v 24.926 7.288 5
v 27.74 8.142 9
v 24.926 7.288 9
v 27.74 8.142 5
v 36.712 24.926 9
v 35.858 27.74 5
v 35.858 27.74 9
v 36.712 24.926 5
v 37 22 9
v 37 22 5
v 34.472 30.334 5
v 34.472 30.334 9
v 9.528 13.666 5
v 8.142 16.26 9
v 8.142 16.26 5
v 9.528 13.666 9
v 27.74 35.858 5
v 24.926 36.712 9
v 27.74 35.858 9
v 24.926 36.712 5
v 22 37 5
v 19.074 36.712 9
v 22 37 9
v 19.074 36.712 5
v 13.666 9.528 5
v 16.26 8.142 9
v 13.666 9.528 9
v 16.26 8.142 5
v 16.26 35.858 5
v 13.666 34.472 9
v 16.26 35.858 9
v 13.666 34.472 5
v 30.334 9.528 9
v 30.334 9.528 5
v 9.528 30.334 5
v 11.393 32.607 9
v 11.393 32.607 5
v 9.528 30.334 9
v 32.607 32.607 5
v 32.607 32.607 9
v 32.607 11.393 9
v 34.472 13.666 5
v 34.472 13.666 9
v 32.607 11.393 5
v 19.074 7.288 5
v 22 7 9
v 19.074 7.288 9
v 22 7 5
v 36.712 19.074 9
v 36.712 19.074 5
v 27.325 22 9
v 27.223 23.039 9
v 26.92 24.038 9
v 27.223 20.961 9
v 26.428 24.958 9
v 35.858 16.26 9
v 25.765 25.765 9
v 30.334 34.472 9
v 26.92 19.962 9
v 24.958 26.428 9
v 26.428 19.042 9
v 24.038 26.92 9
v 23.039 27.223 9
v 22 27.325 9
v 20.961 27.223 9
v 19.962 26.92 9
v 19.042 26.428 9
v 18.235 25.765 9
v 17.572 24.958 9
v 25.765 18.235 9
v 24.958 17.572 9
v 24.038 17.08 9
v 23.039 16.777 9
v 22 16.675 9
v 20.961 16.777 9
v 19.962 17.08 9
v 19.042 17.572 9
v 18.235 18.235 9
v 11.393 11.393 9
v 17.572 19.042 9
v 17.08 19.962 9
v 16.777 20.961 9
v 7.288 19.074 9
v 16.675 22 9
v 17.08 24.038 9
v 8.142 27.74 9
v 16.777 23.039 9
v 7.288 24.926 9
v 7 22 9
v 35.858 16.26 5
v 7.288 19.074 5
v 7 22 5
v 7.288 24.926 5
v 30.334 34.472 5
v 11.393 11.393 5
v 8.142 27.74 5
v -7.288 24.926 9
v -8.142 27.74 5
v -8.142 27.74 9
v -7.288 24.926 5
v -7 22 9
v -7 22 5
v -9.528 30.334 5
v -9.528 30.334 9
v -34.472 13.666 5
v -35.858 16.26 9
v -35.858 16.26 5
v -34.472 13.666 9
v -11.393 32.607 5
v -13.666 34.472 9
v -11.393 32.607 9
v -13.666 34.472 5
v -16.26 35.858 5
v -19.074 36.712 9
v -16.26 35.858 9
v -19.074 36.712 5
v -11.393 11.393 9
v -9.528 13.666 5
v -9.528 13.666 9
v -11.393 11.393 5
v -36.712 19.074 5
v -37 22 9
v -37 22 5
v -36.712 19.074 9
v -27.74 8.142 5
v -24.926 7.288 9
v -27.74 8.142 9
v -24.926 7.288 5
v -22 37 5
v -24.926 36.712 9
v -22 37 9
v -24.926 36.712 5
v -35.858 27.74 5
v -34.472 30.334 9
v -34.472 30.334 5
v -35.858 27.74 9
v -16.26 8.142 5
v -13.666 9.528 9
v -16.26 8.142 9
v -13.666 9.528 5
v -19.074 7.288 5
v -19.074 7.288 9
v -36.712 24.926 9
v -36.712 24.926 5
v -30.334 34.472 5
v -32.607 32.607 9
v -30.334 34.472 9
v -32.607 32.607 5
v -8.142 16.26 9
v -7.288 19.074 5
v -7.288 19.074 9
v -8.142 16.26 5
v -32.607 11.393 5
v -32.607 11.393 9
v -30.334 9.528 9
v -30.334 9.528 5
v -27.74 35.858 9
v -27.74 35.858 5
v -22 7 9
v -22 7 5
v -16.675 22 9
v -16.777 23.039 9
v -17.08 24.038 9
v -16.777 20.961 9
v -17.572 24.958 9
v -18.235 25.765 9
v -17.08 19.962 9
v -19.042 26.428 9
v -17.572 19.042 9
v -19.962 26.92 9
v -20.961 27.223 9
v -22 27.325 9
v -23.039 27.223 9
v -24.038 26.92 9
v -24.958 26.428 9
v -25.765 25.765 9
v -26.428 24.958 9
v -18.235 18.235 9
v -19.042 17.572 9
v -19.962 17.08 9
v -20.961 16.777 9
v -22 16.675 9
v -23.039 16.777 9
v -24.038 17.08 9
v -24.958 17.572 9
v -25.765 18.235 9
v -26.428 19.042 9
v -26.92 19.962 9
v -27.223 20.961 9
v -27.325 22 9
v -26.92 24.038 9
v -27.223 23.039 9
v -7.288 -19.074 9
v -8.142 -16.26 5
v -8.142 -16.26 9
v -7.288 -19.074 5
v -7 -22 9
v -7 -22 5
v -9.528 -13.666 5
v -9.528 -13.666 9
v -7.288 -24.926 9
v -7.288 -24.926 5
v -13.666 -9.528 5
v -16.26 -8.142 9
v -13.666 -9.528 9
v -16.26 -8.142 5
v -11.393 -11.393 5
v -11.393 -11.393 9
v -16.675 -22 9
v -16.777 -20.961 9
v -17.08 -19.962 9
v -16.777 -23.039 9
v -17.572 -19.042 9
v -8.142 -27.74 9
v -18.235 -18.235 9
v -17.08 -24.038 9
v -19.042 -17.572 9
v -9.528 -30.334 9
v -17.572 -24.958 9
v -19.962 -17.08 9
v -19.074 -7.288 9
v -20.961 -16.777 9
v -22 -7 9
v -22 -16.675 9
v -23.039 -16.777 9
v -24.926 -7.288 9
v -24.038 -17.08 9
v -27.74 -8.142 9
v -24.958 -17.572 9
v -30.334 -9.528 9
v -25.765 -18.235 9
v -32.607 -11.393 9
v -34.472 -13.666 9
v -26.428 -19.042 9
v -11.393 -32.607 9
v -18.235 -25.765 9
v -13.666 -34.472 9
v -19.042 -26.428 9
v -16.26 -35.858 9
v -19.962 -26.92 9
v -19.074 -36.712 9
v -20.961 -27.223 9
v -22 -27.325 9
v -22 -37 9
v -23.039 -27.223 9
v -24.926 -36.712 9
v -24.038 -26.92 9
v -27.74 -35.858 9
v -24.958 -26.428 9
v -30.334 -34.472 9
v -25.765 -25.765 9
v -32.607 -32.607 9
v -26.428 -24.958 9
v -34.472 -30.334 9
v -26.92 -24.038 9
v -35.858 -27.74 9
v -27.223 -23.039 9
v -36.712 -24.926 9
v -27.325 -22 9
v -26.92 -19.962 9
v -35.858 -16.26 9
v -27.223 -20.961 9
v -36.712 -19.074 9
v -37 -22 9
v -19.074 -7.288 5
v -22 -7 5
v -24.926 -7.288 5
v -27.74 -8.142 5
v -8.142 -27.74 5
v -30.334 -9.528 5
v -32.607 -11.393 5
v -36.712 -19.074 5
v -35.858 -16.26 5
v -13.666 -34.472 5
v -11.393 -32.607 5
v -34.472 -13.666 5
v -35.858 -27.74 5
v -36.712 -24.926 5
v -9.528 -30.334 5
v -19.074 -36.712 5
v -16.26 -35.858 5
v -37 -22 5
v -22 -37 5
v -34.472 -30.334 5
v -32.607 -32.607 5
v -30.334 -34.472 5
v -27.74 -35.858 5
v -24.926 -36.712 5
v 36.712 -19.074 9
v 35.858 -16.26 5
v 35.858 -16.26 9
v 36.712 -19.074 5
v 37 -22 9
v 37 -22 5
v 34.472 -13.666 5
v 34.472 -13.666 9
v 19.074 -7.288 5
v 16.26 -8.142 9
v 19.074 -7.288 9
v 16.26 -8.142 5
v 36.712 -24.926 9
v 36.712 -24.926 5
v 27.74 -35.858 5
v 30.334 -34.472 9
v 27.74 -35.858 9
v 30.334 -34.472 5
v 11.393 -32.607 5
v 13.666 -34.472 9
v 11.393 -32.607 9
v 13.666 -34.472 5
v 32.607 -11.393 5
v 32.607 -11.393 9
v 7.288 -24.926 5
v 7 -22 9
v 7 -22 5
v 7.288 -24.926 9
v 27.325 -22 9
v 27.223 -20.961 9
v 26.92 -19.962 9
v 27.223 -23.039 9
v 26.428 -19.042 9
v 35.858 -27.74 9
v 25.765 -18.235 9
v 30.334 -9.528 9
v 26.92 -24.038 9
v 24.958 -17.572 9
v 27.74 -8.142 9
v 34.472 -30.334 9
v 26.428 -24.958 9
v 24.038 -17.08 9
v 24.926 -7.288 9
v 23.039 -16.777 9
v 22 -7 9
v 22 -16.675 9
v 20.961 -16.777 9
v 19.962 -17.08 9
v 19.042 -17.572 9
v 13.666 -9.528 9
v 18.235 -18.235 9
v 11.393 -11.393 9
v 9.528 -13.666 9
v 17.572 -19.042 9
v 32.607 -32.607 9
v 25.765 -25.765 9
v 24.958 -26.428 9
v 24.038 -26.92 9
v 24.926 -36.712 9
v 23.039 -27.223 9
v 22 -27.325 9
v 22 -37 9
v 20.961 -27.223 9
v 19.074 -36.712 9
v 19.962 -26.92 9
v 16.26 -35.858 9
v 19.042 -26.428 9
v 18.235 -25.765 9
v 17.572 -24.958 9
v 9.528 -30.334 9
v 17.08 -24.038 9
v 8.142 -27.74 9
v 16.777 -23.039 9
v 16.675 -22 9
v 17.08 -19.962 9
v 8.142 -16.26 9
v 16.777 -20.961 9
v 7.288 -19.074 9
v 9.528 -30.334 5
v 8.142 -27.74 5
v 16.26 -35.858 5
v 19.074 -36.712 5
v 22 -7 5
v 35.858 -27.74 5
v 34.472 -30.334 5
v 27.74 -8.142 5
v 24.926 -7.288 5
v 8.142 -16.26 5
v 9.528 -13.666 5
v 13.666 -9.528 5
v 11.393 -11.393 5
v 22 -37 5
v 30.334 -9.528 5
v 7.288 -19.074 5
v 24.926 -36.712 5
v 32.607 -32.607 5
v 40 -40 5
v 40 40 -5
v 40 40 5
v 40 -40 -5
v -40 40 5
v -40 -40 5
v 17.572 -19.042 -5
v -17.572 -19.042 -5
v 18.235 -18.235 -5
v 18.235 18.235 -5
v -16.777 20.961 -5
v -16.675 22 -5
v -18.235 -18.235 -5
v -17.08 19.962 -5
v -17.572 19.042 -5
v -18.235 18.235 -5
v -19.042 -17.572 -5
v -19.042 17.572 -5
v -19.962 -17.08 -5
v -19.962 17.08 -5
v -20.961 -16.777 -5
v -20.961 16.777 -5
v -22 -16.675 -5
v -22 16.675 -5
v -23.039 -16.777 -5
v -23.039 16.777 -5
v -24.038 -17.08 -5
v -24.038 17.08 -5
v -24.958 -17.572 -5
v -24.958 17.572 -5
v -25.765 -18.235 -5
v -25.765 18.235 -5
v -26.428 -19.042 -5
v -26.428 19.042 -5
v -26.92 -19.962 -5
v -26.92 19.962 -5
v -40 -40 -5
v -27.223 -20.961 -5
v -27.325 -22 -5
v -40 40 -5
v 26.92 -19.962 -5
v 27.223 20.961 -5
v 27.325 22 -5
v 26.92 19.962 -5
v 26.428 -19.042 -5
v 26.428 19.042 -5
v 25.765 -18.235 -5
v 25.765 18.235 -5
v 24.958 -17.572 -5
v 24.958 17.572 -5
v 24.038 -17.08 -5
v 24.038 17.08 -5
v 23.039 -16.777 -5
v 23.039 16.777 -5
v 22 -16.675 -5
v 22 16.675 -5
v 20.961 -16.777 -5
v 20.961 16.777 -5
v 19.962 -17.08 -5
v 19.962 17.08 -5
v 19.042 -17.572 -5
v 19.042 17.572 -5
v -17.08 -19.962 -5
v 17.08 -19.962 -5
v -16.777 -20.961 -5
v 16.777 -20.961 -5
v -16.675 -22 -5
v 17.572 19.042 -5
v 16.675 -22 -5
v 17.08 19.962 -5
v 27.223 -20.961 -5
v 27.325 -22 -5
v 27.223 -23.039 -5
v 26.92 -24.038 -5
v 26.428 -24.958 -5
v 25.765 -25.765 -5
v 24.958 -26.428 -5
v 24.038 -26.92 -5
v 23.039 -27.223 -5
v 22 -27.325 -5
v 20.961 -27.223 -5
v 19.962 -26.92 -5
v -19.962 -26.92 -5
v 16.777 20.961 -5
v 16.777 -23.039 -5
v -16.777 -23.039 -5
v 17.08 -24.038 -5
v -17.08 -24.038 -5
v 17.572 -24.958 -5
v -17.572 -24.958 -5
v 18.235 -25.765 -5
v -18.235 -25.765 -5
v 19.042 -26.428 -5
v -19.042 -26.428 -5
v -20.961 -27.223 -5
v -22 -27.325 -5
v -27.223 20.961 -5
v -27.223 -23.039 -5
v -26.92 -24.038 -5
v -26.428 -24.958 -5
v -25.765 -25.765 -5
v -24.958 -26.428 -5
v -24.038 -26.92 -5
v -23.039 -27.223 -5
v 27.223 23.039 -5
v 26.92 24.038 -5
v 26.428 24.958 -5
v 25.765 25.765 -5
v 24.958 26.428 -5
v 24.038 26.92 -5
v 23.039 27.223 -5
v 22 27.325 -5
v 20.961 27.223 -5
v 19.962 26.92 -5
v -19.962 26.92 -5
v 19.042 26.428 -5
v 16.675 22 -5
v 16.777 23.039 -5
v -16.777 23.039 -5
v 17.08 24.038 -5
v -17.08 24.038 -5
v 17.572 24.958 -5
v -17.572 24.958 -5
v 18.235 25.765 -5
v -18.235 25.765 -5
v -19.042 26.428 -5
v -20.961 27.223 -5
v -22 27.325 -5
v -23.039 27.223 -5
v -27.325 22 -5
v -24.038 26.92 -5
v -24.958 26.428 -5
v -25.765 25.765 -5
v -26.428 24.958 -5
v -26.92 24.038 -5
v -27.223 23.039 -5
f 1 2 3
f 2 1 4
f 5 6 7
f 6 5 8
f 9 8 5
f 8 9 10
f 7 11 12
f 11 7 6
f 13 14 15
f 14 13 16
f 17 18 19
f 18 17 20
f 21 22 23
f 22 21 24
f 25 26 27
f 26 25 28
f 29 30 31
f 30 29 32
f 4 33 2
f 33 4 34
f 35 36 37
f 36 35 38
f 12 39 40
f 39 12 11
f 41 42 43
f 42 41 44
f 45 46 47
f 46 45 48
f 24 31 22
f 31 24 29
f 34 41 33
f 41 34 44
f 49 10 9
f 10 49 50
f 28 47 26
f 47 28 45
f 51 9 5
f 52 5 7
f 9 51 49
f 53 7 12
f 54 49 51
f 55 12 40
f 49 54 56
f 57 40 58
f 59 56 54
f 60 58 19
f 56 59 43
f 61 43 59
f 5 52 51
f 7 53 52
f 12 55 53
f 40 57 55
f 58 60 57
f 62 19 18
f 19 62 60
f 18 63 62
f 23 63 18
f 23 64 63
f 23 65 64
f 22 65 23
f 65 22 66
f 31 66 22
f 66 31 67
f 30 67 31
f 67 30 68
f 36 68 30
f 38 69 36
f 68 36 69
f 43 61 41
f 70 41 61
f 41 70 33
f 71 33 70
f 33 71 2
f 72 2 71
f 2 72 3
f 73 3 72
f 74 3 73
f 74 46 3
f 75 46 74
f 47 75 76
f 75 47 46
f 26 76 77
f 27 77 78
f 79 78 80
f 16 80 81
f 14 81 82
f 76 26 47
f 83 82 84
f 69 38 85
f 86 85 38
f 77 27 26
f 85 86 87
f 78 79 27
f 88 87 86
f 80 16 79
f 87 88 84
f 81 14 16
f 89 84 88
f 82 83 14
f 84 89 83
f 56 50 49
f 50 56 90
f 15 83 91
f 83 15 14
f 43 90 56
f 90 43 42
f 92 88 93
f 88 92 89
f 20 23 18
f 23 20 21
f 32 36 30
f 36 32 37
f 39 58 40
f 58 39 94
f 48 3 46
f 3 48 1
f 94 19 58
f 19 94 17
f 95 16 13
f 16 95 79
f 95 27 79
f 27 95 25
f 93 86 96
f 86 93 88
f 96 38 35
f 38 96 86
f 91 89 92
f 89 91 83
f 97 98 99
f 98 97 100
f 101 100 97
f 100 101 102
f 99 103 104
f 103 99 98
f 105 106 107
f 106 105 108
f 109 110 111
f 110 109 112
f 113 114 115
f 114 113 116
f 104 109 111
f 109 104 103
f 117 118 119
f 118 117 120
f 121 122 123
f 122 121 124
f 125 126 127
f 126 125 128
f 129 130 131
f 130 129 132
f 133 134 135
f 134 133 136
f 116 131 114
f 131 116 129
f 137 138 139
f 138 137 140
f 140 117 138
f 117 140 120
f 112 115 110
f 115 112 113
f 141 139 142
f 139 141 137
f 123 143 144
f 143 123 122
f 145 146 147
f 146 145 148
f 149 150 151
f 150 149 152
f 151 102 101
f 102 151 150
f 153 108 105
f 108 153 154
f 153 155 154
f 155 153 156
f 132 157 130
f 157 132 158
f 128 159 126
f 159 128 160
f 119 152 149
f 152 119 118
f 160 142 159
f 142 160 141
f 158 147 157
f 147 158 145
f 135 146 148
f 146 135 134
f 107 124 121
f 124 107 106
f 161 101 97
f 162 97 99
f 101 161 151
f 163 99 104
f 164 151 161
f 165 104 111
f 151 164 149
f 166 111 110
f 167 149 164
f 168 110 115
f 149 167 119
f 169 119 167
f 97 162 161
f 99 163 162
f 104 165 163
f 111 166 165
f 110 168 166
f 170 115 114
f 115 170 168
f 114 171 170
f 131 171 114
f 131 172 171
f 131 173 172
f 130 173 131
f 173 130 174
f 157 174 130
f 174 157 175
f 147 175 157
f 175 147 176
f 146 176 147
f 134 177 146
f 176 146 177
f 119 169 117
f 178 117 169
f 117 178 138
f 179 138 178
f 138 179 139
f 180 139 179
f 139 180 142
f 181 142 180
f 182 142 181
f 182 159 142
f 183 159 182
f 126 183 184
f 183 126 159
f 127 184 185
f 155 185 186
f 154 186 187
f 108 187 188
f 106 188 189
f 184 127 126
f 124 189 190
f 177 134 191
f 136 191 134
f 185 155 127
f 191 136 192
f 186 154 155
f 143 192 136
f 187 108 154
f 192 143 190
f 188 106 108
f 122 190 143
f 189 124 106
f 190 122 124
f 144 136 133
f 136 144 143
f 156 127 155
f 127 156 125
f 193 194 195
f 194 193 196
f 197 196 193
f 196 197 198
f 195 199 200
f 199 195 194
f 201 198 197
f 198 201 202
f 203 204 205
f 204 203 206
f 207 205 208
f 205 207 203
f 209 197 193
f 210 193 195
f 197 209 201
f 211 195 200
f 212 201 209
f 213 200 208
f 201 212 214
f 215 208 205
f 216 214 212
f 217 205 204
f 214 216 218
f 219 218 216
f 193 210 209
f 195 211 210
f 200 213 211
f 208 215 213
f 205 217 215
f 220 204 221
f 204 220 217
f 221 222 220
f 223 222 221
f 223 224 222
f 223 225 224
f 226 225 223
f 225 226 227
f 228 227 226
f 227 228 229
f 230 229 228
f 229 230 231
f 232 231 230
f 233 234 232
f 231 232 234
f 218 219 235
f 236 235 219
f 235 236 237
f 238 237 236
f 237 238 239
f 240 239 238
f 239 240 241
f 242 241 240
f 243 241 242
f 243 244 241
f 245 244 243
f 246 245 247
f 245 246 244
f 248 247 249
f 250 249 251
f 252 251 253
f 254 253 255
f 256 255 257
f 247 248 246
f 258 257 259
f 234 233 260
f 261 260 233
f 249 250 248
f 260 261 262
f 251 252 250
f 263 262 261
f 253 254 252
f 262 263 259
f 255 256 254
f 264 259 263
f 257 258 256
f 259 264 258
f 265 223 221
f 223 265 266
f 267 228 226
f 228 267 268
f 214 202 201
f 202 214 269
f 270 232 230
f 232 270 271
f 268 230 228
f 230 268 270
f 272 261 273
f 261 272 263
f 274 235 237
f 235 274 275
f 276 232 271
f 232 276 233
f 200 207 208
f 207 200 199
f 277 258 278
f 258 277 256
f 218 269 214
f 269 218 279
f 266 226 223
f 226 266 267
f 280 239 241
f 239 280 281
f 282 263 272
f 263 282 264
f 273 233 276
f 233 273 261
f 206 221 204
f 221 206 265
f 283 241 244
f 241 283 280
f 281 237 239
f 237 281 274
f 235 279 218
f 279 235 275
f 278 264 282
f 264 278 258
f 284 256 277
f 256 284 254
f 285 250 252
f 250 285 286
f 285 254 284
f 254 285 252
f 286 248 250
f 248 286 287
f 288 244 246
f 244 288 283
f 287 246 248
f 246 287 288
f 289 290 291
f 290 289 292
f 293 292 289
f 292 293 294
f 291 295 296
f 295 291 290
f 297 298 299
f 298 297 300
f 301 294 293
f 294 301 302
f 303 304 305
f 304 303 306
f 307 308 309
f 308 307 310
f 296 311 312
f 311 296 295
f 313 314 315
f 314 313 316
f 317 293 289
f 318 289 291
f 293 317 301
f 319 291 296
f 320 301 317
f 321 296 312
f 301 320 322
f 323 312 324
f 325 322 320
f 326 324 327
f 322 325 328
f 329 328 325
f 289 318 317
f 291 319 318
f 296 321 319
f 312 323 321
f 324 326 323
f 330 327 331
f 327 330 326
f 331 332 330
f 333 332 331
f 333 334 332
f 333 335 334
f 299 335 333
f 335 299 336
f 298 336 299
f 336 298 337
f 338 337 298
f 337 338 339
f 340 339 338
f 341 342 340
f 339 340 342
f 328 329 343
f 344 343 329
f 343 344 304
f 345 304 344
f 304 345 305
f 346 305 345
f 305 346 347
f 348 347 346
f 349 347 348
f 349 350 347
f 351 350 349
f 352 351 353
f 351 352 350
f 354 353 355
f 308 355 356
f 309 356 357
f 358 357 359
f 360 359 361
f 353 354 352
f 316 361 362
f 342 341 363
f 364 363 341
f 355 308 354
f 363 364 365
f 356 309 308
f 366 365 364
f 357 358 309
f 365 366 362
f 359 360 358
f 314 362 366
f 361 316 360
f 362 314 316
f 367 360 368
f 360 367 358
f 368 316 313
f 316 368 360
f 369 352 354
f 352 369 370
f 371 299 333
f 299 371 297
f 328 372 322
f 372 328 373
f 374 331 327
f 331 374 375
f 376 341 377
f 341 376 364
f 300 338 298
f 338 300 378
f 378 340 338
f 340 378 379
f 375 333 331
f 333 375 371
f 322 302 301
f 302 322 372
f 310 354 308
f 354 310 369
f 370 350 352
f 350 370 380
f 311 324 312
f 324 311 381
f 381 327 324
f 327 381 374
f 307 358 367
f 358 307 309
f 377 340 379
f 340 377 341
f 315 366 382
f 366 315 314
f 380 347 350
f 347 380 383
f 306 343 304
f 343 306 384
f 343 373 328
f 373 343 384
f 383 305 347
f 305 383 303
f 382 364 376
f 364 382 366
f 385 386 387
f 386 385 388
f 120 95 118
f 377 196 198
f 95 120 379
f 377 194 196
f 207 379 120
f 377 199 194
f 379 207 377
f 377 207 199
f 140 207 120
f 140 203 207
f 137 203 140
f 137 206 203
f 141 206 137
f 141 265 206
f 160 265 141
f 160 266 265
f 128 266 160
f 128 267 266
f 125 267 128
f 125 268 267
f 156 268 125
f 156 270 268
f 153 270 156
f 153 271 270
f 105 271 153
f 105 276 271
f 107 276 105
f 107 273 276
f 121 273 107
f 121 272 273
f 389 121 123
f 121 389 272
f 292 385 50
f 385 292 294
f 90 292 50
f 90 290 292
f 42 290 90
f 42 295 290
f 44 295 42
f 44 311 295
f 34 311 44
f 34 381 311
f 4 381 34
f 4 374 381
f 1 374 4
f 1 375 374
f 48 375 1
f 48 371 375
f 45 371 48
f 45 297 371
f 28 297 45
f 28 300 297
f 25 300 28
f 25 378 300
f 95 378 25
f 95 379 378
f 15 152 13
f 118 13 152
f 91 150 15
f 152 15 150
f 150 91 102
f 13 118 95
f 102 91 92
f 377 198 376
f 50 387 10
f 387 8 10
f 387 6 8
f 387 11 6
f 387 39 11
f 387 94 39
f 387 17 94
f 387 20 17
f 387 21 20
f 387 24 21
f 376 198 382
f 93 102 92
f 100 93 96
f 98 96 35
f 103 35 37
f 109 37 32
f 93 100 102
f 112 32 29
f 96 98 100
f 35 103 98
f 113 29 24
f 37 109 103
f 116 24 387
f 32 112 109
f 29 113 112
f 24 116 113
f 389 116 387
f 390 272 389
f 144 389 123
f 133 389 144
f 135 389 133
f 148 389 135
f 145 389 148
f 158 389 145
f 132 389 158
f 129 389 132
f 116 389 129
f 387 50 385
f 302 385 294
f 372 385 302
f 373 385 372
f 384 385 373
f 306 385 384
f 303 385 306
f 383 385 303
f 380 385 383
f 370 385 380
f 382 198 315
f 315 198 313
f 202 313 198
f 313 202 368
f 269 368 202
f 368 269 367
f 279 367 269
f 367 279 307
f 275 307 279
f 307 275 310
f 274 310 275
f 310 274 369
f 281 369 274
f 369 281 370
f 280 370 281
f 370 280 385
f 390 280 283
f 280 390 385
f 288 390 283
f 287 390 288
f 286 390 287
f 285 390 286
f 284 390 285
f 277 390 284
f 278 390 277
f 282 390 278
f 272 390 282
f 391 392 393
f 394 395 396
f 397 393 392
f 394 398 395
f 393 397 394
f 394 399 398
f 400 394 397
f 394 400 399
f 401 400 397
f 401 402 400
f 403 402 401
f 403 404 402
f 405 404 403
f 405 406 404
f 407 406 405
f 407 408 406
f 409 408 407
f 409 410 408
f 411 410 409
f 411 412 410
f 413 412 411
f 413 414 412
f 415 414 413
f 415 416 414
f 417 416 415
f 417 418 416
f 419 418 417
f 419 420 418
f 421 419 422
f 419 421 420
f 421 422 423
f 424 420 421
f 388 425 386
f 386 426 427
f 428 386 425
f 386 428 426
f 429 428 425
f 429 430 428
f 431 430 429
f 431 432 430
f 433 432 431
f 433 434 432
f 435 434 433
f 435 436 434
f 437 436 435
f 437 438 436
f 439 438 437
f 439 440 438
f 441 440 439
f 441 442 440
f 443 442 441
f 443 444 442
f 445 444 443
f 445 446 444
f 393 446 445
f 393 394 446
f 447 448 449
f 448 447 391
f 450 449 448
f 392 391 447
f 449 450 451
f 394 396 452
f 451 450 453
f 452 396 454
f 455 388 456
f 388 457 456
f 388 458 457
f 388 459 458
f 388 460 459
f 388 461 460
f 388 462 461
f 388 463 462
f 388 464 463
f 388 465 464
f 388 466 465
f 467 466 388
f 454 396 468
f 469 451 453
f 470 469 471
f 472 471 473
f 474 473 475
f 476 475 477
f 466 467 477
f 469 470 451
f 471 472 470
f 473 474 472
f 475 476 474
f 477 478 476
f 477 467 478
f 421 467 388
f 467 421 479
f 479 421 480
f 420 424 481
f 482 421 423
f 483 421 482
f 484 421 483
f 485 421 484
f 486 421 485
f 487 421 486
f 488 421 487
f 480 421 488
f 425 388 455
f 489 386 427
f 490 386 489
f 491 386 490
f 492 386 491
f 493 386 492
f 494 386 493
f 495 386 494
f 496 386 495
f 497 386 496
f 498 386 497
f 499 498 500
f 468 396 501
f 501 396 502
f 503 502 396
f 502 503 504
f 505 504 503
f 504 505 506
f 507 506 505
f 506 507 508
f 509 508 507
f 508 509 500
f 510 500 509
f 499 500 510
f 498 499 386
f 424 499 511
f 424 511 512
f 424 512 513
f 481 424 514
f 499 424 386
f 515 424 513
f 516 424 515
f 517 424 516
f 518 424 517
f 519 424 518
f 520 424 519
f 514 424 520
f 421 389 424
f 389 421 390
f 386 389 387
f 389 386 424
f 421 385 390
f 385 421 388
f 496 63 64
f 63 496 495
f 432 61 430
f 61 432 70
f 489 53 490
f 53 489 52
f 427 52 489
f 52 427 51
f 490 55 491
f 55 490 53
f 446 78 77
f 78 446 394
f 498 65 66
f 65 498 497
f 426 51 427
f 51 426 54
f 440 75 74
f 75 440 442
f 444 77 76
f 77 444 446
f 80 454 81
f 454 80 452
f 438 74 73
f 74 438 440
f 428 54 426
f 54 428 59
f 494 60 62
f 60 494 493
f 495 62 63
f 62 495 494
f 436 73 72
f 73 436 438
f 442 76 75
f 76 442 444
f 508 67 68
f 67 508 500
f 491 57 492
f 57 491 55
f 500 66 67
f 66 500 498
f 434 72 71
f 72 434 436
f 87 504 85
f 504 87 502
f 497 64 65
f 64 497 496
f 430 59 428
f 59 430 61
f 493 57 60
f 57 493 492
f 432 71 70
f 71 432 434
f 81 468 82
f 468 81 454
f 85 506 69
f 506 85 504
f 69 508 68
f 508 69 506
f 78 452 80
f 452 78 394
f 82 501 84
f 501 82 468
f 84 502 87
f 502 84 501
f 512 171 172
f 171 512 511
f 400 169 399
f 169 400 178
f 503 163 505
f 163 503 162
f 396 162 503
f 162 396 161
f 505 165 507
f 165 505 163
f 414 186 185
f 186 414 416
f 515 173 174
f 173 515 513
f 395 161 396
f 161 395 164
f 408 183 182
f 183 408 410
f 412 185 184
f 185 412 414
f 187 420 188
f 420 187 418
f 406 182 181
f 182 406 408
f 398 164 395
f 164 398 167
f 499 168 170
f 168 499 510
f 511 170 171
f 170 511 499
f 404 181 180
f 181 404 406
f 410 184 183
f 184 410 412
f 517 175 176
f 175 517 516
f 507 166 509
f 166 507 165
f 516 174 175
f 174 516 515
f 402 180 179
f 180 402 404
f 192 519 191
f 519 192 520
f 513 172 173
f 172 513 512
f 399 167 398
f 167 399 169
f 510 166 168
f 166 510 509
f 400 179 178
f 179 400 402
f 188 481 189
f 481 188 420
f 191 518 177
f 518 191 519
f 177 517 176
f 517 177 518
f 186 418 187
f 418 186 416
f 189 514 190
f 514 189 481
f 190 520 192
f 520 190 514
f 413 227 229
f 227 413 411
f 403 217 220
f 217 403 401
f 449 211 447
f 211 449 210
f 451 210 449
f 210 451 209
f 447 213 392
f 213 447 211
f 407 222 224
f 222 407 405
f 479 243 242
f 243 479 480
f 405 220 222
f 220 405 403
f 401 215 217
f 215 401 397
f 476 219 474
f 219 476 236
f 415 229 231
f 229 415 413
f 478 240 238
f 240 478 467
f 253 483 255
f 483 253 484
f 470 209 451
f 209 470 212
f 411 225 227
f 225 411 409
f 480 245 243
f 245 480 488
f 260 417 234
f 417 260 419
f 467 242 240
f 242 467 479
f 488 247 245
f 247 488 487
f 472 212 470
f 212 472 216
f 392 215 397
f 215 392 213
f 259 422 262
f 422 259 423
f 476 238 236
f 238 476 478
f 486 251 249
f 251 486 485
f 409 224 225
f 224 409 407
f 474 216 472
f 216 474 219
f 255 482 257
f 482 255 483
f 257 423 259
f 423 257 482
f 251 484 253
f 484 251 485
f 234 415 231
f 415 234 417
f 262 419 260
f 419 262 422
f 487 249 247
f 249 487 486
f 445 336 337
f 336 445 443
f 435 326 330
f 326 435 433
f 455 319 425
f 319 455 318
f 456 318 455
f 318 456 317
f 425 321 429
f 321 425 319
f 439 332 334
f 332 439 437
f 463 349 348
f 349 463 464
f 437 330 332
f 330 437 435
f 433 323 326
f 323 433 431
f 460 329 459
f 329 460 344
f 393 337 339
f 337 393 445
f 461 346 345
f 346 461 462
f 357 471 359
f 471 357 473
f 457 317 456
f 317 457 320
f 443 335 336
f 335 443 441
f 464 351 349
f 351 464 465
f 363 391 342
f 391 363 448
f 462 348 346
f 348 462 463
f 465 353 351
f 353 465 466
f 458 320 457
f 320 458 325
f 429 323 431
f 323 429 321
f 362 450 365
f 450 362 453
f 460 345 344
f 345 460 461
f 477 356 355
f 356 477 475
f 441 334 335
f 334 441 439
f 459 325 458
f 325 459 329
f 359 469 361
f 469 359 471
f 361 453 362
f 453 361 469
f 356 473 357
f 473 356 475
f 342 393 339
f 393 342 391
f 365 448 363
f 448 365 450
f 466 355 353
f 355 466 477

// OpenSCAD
$fn = 32;

// ----------------------------------------------------------------------
// Anchor pads 80 x 80 x 14
// four corner bosses with anchor holes
// ----------------------------------------------------------------------

// --- parameters (mm) ---
plate = [80, 80, 10];    // base plate size (x, y, z)
pads = 4;                // boss count, one per corner
edge = 18;               // boss centre offset from the plate edge
boss_d = 30;             // boss diameter
boss_h = 4;              // boss height above the base plate
bore_d = 10.5;           // nominal hole diameter from the drawing
print_allowance = 0.15;  // clearance added for printing

// --- derived feature positions (mm) ---
hole_d = bore_d + print_allowance;  // = 10.65   hole diameter as printed
height = plate[2] + boss_h;         // = 14   overall height of the part
corner_x = plate[0] / 2 - edge;     // = 22   boss centre X
corner_y = plate[1] / 2 - edge;     // = 22   boss centre Y
feature_centers = [
  [corner_x, corner_y],
  [-corner_x, corner_y],
  [-corner_x, -corner_y],
  [corner_x, -corner_y]
];   // boss centres, anchor holes are drilled there

// base plate, four bosses standing on it, anchor holes all the way through
difference() {
  union() {
    cube(plate, center = true);
    for (centre = feature_centers)
      translate([centre[0], centre[1], plate[2] / 2 - 1])
        cylinder(d = boss_d, h = boss_h + 1);
  }
  for (centre = feature_centers)
    translate([centre[0], centre[1], -height])
      cylinder(d = hole_d, h = 2 * height + 2);  // through boss and plate
}
